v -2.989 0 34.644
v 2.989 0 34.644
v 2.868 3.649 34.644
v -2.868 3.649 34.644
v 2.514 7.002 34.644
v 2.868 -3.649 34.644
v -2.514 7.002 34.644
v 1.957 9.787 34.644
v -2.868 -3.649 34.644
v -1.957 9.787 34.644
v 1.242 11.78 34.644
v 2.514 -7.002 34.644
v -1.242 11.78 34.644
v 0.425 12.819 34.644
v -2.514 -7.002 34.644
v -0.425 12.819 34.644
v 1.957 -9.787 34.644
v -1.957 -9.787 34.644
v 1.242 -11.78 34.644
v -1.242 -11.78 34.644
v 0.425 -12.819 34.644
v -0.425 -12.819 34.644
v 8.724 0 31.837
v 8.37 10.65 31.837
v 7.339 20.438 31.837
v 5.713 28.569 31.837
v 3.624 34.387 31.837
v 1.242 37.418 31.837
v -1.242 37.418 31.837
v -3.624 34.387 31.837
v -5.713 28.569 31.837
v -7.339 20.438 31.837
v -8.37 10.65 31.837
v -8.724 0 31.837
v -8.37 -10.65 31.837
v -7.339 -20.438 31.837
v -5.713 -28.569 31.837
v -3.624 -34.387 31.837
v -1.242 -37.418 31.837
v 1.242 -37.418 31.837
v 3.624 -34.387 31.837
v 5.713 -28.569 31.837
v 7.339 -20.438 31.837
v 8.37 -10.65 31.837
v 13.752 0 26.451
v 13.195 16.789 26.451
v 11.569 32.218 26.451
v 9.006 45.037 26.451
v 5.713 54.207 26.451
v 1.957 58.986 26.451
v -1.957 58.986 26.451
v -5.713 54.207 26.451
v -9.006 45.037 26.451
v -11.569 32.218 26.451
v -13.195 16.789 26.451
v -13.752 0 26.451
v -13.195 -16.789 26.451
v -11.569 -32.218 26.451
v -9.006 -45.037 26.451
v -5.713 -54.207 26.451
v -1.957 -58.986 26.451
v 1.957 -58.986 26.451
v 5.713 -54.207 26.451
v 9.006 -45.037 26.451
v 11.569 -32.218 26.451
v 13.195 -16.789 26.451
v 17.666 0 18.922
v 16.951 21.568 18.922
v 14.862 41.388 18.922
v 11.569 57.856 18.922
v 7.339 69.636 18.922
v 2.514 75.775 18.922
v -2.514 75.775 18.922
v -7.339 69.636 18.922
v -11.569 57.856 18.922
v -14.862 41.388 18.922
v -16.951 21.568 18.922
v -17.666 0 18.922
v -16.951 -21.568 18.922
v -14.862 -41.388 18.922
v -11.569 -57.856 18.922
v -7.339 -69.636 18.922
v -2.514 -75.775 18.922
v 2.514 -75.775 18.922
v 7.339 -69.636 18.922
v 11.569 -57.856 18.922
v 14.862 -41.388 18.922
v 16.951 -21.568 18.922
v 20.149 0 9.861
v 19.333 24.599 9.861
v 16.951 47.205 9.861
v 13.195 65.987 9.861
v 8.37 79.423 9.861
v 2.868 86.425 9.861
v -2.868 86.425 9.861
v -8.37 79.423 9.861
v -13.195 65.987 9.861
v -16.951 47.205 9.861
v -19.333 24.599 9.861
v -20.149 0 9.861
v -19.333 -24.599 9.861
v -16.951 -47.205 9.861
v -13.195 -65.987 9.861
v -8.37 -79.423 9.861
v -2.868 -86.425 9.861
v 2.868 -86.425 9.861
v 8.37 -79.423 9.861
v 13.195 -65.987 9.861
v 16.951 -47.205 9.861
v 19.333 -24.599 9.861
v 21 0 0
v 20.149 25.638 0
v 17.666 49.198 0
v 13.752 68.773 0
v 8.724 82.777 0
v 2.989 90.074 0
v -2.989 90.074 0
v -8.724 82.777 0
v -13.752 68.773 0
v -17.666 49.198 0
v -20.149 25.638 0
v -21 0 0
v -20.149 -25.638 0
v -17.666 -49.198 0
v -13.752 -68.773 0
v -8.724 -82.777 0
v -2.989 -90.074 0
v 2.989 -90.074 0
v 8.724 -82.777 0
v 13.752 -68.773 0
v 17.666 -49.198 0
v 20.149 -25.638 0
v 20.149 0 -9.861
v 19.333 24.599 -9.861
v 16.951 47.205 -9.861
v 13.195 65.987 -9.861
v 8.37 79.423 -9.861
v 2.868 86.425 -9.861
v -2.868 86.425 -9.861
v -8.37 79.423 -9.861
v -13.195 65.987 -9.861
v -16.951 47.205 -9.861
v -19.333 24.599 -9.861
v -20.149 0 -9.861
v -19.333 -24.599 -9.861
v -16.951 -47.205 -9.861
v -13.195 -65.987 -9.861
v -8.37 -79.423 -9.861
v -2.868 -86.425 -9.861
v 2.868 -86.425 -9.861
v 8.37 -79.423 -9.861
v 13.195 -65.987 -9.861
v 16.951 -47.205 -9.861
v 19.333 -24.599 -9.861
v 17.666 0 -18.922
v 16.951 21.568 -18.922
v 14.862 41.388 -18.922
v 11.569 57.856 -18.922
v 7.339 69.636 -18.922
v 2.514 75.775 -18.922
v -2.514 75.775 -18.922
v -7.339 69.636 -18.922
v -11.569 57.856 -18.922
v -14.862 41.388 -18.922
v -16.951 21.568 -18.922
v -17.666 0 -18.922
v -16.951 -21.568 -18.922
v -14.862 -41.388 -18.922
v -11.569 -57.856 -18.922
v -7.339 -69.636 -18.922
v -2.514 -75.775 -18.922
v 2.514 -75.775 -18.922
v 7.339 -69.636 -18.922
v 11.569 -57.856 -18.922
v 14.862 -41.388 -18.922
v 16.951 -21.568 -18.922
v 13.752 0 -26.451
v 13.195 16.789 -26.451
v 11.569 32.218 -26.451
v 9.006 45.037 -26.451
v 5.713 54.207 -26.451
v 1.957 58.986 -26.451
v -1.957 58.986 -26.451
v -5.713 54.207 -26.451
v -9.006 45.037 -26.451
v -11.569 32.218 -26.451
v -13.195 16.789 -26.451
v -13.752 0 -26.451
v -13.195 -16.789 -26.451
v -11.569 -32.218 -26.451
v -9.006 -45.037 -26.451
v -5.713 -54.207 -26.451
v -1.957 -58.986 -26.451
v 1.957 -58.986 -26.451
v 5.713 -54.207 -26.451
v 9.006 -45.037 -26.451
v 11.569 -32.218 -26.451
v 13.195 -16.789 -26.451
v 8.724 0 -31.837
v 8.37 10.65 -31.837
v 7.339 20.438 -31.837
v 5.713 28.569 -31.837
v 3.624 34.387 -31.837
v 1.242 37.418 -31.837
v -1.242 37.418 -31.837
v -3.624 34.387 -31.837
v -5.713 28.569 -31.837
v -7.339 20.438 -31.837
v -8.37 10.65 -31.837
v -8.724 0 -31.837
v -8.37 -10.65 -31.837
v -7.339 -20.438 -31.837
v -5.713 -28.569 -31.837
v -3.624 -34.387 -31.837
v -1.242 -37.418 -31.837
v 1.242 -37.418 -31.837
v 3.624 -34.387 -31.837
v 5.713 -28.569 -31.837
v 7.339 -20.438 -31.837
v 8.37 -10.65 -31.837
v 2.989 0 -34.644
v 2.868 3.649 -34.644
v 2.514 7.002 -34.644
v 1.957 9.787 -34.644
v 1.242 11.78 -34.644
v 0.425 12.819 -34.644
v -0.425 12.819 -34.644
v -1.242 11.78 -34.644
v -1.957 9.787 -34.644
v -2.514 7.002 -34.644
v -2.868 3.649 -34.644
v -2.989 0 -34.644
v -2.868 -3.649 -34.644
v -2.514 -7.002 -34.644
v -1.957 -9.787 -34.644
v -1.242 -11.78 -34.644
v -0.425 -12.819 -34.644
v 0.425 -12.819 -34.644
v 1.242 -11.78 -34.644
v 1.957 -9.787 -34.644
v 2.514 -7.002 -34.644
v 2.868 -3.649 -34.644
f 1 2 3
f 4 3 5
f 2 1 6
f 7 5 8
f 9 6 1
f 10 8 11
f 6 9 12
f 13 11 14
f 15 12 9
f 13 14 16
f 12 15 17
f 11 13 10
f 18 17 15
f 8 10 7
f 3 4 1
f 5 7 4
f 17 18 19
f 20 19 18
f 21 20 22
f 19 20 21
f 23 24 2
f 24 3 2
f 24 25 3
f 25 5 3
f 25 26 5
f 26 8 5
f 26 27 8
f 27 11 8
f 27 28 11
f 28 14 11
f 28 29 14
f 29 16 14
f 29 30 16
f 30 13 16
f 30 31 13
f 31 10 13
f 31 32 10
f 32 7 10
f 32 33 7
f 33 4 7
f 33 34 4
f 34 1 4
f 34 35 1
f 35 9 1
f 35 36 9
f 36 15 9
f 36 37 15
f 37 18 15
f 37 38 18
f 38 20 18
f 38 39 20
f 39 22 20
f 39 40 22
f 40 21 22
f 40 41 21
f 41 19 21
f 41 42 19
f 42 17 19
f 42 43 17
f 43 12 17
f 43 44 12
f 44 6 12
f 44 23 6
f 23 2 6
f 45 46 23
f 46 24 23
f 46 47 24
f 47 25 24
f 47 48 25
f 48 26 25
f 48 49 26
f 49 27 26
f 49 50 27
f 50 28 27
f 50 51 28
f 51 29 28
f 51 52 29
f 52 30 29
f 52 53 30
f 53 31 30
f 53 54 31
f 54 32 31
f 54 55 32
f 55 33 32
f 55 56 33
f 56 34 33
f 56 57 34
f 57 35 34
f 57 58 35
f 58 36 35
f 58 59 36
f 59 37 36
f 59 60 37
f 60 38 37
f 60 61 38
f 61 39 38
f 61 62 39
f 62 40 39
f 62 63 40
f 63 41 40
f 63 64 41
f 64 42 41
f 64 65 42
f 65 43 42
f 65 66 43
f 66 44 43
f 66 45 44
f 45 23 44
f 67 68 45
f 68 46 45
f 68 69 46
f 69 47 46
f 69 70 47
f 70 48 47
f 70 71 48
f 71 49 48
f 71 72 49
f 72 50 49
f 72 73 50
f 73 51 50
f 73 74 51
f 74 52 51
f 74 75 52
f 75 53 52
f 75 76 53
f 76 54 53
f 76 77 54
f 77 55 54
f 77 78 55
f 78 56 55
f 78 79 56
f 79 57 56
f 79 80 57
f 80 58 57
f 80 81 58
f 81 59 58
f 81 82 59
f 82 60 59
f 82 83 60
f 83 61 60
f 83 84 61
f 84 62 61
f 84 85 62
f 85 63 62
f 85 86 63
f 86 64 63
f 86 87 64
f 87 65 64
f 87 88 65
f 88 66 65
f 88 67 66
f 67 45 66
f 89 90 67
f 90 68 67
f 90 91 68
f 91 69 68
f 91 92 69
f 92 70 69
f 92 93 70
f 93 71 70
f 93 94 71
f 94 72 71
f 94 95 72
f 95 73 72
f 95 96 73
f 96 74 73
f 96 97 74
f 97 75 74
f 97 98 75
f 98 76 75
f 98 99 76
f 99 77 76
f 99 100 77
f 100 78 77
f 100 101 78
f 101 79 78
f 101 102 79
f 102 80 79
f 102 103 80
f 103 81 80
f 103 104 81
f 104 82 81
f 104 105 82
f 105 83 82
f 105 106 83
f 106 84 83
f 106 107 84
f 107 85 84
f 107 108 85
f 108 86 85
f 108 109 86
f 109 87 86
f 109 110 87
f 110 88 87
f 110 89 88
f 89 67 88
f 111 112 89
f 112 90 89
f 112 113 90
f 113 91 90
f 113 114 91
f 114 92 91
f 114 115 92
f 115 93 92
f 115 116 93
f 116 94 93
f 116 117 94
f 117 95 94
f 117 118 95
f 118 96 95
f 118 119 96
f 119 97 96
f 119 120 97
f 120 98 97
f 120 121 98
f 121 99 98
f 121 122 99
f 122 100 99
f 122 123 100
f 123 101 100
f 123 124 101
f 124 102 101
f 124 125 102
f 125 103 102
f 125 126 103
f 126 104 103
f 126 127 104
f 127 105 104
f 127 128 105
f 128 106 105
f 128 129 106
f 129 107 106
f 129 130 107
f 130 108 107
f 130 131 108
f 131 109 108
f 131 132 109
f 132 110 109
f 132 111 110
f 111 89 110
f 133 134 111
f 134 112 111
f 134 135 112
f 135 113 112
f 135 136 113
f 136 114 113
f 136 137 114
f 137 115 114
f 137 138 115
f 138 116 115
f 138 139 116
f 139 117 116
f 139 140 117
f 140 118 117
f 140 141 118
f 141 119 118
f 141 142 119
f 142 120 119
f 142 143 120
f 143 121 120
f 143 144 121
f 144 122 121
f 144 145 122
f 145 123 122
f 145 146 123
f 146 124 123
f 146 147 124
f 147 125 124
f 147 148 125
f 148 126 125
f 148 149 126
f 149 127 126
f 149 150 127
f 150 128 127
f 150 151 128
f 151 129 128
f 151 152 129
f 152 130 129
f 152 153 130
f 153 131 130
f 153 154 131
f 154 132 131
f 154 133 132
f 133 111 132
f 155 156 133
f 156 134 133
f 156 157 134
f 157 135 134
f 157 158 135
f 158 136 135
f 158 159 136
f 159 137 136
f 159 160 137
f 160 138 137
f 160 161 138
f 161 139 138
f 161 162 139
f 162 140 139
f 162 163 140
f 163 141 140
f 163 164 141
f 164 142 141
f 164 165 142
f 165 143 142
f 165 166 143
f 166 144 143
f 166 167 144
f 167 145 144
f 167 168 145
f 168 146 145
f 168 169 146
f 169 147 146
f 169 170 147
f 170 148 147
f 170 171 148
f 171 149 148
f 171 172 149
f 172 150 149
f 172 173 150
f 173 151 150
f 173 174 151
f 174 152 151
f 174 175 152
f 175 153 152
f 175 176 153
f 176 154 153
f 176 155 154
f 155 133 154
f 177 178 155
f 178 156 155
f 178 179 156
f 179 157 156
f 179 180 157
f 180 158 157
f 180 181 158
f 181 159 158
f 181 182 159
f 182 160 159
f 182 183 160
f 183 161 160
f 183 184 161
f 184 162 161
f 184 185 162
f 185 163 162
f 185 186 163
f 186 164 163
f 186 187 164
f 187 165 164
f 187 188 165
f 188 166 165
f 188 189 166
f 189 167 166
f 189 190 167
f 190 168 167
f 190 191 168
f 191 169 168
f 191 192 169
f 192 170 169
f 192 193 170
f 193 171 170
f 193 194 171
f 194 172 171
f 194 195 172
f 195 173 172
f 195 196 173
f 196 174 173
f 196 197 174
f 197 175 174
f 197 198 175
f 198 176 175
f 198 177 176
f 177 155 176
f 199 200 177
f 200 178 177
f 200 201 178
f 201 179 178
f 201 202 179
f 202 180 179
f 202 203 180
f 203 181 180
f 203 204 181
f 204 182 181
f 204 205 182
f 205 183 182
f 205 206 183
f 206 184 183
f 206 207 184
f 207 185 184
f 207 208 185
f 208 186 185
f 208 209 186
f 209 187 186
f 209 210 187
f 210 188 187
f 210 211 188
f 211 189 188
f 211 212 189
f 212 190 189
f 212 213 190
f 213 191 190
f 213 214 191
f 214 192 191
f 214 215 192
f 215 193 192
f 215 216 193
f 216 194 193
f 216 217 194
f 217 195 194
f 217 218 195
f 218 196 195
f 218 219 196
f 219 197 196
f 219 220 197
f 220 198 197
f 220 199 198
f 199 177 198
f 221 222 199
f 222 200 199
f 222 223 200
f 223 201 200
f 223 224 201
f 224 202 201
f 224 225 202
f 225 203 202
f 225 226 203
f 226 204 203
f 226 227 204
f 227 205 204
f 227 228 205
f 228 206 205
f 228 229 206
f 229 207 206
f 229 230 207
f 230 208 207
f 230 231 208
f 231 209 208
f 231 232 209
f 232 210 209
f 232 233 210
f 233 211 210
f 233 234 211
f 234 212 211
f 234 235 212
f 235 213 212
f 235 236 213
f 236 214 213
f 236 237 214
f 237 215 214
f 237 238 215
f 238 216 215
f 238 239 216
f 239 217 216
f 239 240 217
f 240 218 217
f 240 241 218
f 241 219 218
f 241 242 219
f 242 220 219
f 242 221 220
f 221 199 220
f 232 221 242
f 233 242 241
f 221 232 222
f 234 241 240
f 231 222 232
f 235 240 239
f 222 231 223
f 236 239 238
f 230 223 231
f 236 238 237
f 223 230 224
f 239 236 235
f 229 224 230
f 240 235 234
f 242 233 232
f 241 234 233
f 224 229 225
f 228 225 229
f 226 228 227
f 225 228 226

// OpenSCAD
// Generated by SolidPython 1.0.1 on 2020-07-29 00:46:45


scale(v = [3, 13, 5]) {
	sphere(r = 7);
}
/***********************************************
*********      SolidPython code:      **********
************************************************
 
# import packages: SolidPython
from solid import *
from solid.utils import *
from itertools import chain, combinations, permutations


class Resize:

    def __init__(self, scad_file):
        self.scad_file = scad_file
        #self.scad_file = import_scad(scad_file)
        # cone/cylinder param:
        self.r1 = 0
        self.r2 = 0
        self.h = 0
        # rectangular prism param:
        self.w = 0
        self.l = 0
        # ellipse param:
        self.r = 0

    # import OpenScad code (file name corresponds to shape)


    # classify shape + parameters
    def assign(self, param1, param2, param3):
        if self.scad_file == 'cone.scad':
            self.r1 = param1
            self.r2 = param2
            self.h = param3
        elif self.scad_file == 'cylinder.scad':
            self.r1 = param1
            self.r2 = param2
            self.h = param3
        elif self.scad_file == 'rectangularPrism.scad':
            self.h = param1
            self.l = param2
            self.w = param3
        else:
            self.r = param1
            self.h = param2

    # resize parameters
    def iterate(self):
        x = range(3, 20, 2)
        i = 1
        if self.scad_file == 'cone.scad':
            tempList = list(permutations(x, 2))
            for temp in tempList:
                param1 = temp[0]
                param2 = temp[1]
                filepath = 'produced_scad_files/' + 'cone' + str(param1) + '_' + str(param2) + '_' + '.scad'
                scad_render_to_file(cylinder(h=param1, r1=param2, r2=0), filepath)

        elif self.scad_file == 'cylinder.scad':
            tempList = list(permutations(x, 3))
            for temp in tempList:
                param1 = temp[0]
                param2 = temp[1]
                filepath = 'produced_scad_files/' + 'cylinder' + str(param1) + '_' + str(param2) + '_' + '.scad'
                scad_render_to_file(cylinder(h=param1, r1=param2, r2=param2), filepath)

        elif self.scad_file == 'rectangularPrism.scad':
            tempList = list(permutations(x, 3))
            for temp in tempList:
                param1 = temp[0]
                param2 = temp[1]
                param3 = temp[2]
                filepath = 'produced_scad_files/' + 'rectangularPrism' + str(param1) + '_' + str(param2) + '_' + str(
                    param3) + '.scad'
                scad_render_to_file(cube(size=(param1, param2, param3)), filepath)

        elif self.scad_file == 'ellipse.scad':
            tempList = list(permutations(x, 4))
            for temp in tempList:
                param1 = temp[0]
                param2 = temp[1]
                param3 = temp[2]
                param4 = temp[3]
                filepath = 'produced_scad_files/' + 'ellipse' + str(param1) + '_' + str(param2) + '_' + str(param3) + '_' + str(param4) + '.scad'
                scad_render_to_file(scale([param1, param2, param3])(sphere(r=param4)), filepath)

    def render_to_scadfile(self):
        scad_render_to_file(scad, 'example.scad') 
 
************************************************/
